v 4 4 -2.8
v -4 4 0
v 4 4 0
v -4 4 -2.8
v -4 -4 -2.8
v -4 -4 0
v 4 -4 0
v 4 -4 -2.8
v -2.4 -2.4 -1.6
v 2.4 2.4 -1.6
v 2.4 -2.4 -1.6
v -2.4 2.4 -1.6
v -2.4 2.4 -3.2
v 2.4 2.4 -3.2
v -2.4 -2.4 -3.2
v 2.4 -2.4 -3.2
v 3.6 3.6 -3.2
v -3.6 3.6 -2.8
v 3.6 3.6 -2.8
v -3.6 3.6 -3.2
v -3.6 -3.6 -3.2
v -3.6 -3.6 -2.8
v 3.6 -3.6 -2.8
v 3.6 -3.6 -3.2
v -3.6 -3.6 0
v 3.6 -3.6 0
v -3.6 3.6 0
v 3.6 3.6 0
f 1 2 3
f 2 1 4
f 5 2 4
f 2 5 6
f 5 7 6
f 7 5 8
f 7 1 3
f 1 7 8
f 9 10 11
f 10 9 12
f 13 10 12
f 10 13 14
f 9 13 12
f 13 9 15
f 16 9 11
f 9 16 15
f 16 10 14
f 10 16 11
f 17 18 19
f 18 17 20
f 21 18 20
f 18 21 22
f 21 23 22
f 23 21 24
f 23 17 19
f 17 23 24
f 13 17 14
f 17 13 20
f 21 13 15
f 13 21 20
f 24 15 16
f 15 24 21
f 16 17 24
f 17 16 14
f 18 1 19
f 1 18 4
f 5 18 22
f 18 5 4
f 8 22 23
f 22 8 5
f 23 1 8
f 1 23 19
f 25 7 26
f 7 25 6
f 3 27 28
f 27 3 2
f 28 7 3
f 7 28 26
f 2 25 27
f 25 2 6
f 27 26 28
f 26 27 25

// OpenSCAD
// file: ../p/box5.scad
use <../lib.scad>
function ldraw_lib__box5() = [
// 0 Box with 5 Faces and All Edges
// 0 Name: box5.dat
// 0 Author: James Jessiman
// 0 !LDRAW_ORG Primitive UPDATE 2012-01
// 0 !LICENSE Licensed under CC BY 2.0 and CC BY 4.0 : see CAreadme.txt
// 
// 0 BFC CERTIFY CCW
  [0,"BFC","CERTIFY"],
  [0,"BFC","CCW"],
// 
// 0 !HISTORY 2002-04-03 [sbliss] Modified for BFC compliance
// 0 !HISTORY 2002-04-25 [PTadmin] Official Update 2002-02
// 0 !HISTORY 2007-06-24 [PTadmin] Header formatted for Contributor Agreement
// 0 !HISTORY 2008-07-01 [PTadmin] Official Update 2008-01
// 0 !HISTORY 2012-02-16 [Philo] Changed to CCW
// 0 !HISTORY 2012-03-30 [PTadmin] Official Update 2012-01
// 
// 
// 2 24 1 1 1 -1 1 1
  [2,24,1,1,1,-1,1,1],
// 2 24 -1 1 1 -1 1 -1
  [2,24,-1,1,1,-1,1,-1],
// 2 24 -1 1 -1 1 1 -1
  [2,24,-1,1,-1,1,1,-1],
// 2 24 1 1 -1 1 1 1
  [2,24,1,1,-1,1,1,1],
// 2 24 1 0 1 -1 0 1
  [2,24,1,0,1,-1,0,1],
// 2 24 -1 0 1 -1 0 -1
  [2,24,-1,0,1,-1,0,-1],
// 2 24 -1 0 -1 1 0 -1
  [2,24,-1,0,-1,1,0,-1],
// 2 24 1 0 -1 1 0 1
  [2,24,1,0,-1,1,0,1],
// 2 24 1 0 1 1 1 1
  [2,24,1,0,1,1,1,1],
// 2 24 -1 0 1 -1 1 1
  [2,24,-1,0,1,-1,1,1],
// 2 24 1 0 -1 1 1 -1
  [2,24,1,0,-1,1,1,-1],
// 2 24 -1 0 -1 -1 1 -1
  [2,24,-1,0,-1,-1,1,-1],
// 4 16 -1 1 1 1 1 1 1 1 -1 -1 1 -1
  [4,16,-1,1,1,1,1,1,1,1,-1,-1,1,-1],
// 4 16 -1 1 1 -1 0 1 1 0 1 1 1 1
  [4,16,-1,1,1,-1,0,1,1,0,1,1,1,1],
// 4 16 -1 1 -1 -1 0 -1 -1 0 1 -1 1 1
  [4,16,-1,1,-1,-1,0,-1,-1,0,1,-1,1,1],
// 4 16 1 1 -1 1 0 -1 -1 0 -1 -1 1 -1
  [4,16,1,1,-1,1,0,-1,-1,0,-1,-1,1,-1],
// 4 16 1 1 1 1 0 1 1 0 -1 1 1 -1
  [4,16,1,1,1,1,0,1,1,0,-1,1,1,-1],
];
makepoly(ldraw_lib__box5(), line=0.2);
// file: ../p/box4.scad
use <../lib.scad>
function ldraw_lib__box4() = [
// 0 Box with 4 Faces (2 Parallel Pairs) and All Edges
// 0 Name: box4.dat
// 0 Author: James Jessiman
// 0 !LDRAW_ORG Primitive UPDATE 2012-01
// 0 !LICENSE Licensed under CC BY 2.0 and CC BY 4.0 : see CAreadme.txt
// 
// 0 BFC CERTIFY CCW
  [0,"BFC","CERTIFY"],
  [0,"BFC","CCW"],
// 
// 0 !HISTORY 2002-04-03 [sbliss] Modified for BFC compliance
// 0 !HISTORY 2002-04-25 [PTadmin] Official Update 2002-02
// 0 !HISTORY 2007-06-24 [PTadmin] Header formatted for Contributor Agreement
// 0 !HISTORY 2008-07-01 [PTadmin] Official Update 2008-01
// 0 !HISTORY 2012-02-16 [Philo] Changed to CCW
// 0 !HISTORY 2012-03-30 [PTadmin] Official Update 2012-01
// 
// 
// 2 24 1 1 1 -1 1 1
  [2,24,1,1,1,-1,1,1],
// 2 24 -1 1 1 -1 1 -1
  [2,24,-1,1,1,-1,1,-1],
// 2 24 -1 1 -1 1 1 -1
  [2,24,-1,1,-1,1,1,-1],
// 2 24 1 1 -1 1 1 1
  [2,24,1,1,-1,1,1,1],
// 2 24 1 0 1 -1 0 1
  [2,24,1,0,1,-1,0,1],
// 2 24 -1 0 1 -1 0 -1
  [2,24,-1,0,1,-1,0,-1],
// 2 24 -1 0 -1 1 0 -1
  [2,24,-1,0,-1,1,0,-1],
// 2 24 1 0 -1 1 0 1
  [2,24,1,0,-1,1,0,1],
// 2 24 1 0 1 1 1 1
  [2,24,1,0,1,1,1,1],
// 2 24 -1 0 1 -1 1 1
  [2,24,-1,0,1,-1,1,1],
// 2 24 1 0 -1 1 1 -1
  [2,24,1,0,-1,1,1,-1],
// 2 24 -1 0 -1 -1 1 -1
  [2,24,-1,0,-1,-1,1,-1],
// 4 16 -1 1 1 -1 0 1 1 0 1 1 1 1
  [4,16,-1,1,1,-1,0,1,1,0,1,1,1,1],
// 4 16 -1 1 -1 -1 0 -1 -1 0 1 -1 1 1
  [4,16,-1,1,-1,-1,0,-1,-1,0,1,-1,1,1],
// 4 16 1 1 -1 1 0 -1 -1 0 -1 -1 1 -1
  [4,16,1,1,-1,1,0,-1,-1,0,-1,-1,1,-1],
// 4 16 1 1 1 1 0 1 1 0 -1 1 1 -1
  [4,16,1,1,1,1,0,1,1,0,-1,1,1,-1],
];
makepoly(ldraw_lib__box4(), line=0.2);
// file: s/3070bs01.scad
use <../../lib.scad>
use <../../p/box4.scad>
use <../../p/box5.scad>
function ldraw_lib__s__3070bs01() = [
// 0 ~Tile  1 x  1 with Groove without Top Face
// 0 Name: s\3070bs01.dat
// 0 Author: Chris Dee [cwdee]
// 0 !LDRAW_ORG Subpart UPDATE 2009-02
// 0 !LICENSE Licensed under CC BY 2.0 and CC BY 4.0 : see CAreadme.txt
// 
// 0 BFC CERTIFY CCW
  [0,"BFC","CERTIFY"],
  [0,"BFC","CCW"],
// 
// 0 !HISTORY 2009-09-03 [PTadmin] Official Update 2009-02
// 
// 
// 1 16 0 0 0 10 0 0 0 7 0 0 0 10 box4.dat
  [1,16,0,0,0,10,0,0,0,7,0,0,0,10, ldraw_lib__box4()],
// 0 BFC INVERTNEXT
  [0,"BFC","INVERTNEXT"],
// 1 16 0 8 0 6 0 0 0 -4 0 0 0 6 box5.dat
  [1,16,0,8,0,6,0,0,0,-4,0,0,0,6, ldraw_lib__box5()],
// 1 16 0 7 0 9 0 0 0 1 0 0 0 9 box4.dat
  [1,16,0,7,0,9,0,0,0,1,0,0,0,9, ldraw_lib__box4()],
// 
// 4 16 9 8 9 6 8 6 -6 8 6 -9 8 9
  [4,16,9,8,9,6,8,6,-6,8,6,-9,8,9],
// 4 16 -9 8 9 -6 8 6 -6 8 -6 -9 8 -9
  [4,16,-9,8,9,-6,8,6,-6,8,-6,-9,8,-9],
// 4 16 -9 8 -9 -6 8 -6 6 8 -6 9 8 -9
  [4,16,-9,8,-9,-6,8,-6,6,8,-6,9,8,-9],
// 4 16 9 8 -9 6 8 -6 6 8 6 9 8 9
  [4,16,9,8,-9,6,8,-6,6,8,6,9,8,9],
// 
// 4 16 10 7 10 9 7 9 -9 7 9 -10 7 10
  [4,16,10,7,10,9,7,9,-9,7,9,-10,7,10],
// 4 16 -10 7 10 -9 7 9 -9 7 -9 -10 7 -10
  [4,16,-10,7,10,-9,7,9,-9,7,-9,-10,7,-10],
// 4 16 -10 7 -10 -9 7 -9 9 7 -9 10 7 -10
  [4,16,-10,7,-10,-9,7,-9,9,7,-9,10,7,-10],
// 4 16 10 7 -10 9 7 -9 9 7 9 10 7 10
  [4,16,10,7,-10,9,7,-9,9,7,9,10,7,10],
// 0
];
makepoly(ldraw_lib__s__3070bs01(), line=0.2);
// main file
use <../lib.scad>
use <s/3070bs01.scad>
function ldraw_lib__3070bp00() = [
// 0 Tile  1 x  1 with Top White Square Pattern
// 0 Name: 3070bp00.dat
// 0 Author: Heiko Jelnikar [KlotzKiste]
// 0 !LDRAW_ORG Part UPDATE 2018-01
// 0 !LICENSE Licensed under CC BY 2.0 and CC BY 4.0 : see CAreadme.txt
// 
// 0 BFC CERTIFY CCW
  [0,"BFC","CERTIFY"],
  [0,"BFC","CCW"],
// 
// 0 !KEYWORDS 3070bpb103, Brickheadz, Iron Man, Set 41590, Set 75873
// 0 !KEYWORDS Speed Champions
// 
// 0 !HISTORY 2016-12-31 [PTadmin] Official Update 2016-01
// 0 !HISTORY 2017-09-16 [Darats] Reduced Pattern Size, Added Keywords
// 0 !HISTORY 2018-01-30 [PTadmin] Official Update 2018-01
// 
// 
// 1 16 0 0 0 1 0 0 0 1 0 0 0 1 s\3070bs01.dat
  [1,16,0,0,0,1,0,0,0,1,0,0,0,1, ldraw_lib__s__3070bs01()],
// 4 16 -9 0 -9 -10 0 -10 10 0 -10 9 0 -9
  [4,16,-9,0,-9,-10,0,-10,10,0,-10,9,0,-9],
// 4 16 10 0 10 -10 0 10 -9 0 9 9 0 9
  [4,16,10,0,10,-10,0,10,-9,0,9,9,0,9],
// 4 16 10 0 -10 10 0 10 9 0 9 9 0 -9
  [4,16,10,0,-10,10,0,10,9,0,9,9,0,-9],
// 4 16 -9 0 9 -10 0 10 -10 0 -10 -9 0 -9
  [4,16,-9,0,9,-10,0,10,-10,0,-10,-9,0,-9],
// 4 15 9 0 9 -9 0 9 -9 0 -9 9 0 -9
  [4,15,9,0,9,-9,0,9,-9,0,-9,9,0,-9],
];
makepoly(ldraw_lib__3070bp00(), line=0.2);
